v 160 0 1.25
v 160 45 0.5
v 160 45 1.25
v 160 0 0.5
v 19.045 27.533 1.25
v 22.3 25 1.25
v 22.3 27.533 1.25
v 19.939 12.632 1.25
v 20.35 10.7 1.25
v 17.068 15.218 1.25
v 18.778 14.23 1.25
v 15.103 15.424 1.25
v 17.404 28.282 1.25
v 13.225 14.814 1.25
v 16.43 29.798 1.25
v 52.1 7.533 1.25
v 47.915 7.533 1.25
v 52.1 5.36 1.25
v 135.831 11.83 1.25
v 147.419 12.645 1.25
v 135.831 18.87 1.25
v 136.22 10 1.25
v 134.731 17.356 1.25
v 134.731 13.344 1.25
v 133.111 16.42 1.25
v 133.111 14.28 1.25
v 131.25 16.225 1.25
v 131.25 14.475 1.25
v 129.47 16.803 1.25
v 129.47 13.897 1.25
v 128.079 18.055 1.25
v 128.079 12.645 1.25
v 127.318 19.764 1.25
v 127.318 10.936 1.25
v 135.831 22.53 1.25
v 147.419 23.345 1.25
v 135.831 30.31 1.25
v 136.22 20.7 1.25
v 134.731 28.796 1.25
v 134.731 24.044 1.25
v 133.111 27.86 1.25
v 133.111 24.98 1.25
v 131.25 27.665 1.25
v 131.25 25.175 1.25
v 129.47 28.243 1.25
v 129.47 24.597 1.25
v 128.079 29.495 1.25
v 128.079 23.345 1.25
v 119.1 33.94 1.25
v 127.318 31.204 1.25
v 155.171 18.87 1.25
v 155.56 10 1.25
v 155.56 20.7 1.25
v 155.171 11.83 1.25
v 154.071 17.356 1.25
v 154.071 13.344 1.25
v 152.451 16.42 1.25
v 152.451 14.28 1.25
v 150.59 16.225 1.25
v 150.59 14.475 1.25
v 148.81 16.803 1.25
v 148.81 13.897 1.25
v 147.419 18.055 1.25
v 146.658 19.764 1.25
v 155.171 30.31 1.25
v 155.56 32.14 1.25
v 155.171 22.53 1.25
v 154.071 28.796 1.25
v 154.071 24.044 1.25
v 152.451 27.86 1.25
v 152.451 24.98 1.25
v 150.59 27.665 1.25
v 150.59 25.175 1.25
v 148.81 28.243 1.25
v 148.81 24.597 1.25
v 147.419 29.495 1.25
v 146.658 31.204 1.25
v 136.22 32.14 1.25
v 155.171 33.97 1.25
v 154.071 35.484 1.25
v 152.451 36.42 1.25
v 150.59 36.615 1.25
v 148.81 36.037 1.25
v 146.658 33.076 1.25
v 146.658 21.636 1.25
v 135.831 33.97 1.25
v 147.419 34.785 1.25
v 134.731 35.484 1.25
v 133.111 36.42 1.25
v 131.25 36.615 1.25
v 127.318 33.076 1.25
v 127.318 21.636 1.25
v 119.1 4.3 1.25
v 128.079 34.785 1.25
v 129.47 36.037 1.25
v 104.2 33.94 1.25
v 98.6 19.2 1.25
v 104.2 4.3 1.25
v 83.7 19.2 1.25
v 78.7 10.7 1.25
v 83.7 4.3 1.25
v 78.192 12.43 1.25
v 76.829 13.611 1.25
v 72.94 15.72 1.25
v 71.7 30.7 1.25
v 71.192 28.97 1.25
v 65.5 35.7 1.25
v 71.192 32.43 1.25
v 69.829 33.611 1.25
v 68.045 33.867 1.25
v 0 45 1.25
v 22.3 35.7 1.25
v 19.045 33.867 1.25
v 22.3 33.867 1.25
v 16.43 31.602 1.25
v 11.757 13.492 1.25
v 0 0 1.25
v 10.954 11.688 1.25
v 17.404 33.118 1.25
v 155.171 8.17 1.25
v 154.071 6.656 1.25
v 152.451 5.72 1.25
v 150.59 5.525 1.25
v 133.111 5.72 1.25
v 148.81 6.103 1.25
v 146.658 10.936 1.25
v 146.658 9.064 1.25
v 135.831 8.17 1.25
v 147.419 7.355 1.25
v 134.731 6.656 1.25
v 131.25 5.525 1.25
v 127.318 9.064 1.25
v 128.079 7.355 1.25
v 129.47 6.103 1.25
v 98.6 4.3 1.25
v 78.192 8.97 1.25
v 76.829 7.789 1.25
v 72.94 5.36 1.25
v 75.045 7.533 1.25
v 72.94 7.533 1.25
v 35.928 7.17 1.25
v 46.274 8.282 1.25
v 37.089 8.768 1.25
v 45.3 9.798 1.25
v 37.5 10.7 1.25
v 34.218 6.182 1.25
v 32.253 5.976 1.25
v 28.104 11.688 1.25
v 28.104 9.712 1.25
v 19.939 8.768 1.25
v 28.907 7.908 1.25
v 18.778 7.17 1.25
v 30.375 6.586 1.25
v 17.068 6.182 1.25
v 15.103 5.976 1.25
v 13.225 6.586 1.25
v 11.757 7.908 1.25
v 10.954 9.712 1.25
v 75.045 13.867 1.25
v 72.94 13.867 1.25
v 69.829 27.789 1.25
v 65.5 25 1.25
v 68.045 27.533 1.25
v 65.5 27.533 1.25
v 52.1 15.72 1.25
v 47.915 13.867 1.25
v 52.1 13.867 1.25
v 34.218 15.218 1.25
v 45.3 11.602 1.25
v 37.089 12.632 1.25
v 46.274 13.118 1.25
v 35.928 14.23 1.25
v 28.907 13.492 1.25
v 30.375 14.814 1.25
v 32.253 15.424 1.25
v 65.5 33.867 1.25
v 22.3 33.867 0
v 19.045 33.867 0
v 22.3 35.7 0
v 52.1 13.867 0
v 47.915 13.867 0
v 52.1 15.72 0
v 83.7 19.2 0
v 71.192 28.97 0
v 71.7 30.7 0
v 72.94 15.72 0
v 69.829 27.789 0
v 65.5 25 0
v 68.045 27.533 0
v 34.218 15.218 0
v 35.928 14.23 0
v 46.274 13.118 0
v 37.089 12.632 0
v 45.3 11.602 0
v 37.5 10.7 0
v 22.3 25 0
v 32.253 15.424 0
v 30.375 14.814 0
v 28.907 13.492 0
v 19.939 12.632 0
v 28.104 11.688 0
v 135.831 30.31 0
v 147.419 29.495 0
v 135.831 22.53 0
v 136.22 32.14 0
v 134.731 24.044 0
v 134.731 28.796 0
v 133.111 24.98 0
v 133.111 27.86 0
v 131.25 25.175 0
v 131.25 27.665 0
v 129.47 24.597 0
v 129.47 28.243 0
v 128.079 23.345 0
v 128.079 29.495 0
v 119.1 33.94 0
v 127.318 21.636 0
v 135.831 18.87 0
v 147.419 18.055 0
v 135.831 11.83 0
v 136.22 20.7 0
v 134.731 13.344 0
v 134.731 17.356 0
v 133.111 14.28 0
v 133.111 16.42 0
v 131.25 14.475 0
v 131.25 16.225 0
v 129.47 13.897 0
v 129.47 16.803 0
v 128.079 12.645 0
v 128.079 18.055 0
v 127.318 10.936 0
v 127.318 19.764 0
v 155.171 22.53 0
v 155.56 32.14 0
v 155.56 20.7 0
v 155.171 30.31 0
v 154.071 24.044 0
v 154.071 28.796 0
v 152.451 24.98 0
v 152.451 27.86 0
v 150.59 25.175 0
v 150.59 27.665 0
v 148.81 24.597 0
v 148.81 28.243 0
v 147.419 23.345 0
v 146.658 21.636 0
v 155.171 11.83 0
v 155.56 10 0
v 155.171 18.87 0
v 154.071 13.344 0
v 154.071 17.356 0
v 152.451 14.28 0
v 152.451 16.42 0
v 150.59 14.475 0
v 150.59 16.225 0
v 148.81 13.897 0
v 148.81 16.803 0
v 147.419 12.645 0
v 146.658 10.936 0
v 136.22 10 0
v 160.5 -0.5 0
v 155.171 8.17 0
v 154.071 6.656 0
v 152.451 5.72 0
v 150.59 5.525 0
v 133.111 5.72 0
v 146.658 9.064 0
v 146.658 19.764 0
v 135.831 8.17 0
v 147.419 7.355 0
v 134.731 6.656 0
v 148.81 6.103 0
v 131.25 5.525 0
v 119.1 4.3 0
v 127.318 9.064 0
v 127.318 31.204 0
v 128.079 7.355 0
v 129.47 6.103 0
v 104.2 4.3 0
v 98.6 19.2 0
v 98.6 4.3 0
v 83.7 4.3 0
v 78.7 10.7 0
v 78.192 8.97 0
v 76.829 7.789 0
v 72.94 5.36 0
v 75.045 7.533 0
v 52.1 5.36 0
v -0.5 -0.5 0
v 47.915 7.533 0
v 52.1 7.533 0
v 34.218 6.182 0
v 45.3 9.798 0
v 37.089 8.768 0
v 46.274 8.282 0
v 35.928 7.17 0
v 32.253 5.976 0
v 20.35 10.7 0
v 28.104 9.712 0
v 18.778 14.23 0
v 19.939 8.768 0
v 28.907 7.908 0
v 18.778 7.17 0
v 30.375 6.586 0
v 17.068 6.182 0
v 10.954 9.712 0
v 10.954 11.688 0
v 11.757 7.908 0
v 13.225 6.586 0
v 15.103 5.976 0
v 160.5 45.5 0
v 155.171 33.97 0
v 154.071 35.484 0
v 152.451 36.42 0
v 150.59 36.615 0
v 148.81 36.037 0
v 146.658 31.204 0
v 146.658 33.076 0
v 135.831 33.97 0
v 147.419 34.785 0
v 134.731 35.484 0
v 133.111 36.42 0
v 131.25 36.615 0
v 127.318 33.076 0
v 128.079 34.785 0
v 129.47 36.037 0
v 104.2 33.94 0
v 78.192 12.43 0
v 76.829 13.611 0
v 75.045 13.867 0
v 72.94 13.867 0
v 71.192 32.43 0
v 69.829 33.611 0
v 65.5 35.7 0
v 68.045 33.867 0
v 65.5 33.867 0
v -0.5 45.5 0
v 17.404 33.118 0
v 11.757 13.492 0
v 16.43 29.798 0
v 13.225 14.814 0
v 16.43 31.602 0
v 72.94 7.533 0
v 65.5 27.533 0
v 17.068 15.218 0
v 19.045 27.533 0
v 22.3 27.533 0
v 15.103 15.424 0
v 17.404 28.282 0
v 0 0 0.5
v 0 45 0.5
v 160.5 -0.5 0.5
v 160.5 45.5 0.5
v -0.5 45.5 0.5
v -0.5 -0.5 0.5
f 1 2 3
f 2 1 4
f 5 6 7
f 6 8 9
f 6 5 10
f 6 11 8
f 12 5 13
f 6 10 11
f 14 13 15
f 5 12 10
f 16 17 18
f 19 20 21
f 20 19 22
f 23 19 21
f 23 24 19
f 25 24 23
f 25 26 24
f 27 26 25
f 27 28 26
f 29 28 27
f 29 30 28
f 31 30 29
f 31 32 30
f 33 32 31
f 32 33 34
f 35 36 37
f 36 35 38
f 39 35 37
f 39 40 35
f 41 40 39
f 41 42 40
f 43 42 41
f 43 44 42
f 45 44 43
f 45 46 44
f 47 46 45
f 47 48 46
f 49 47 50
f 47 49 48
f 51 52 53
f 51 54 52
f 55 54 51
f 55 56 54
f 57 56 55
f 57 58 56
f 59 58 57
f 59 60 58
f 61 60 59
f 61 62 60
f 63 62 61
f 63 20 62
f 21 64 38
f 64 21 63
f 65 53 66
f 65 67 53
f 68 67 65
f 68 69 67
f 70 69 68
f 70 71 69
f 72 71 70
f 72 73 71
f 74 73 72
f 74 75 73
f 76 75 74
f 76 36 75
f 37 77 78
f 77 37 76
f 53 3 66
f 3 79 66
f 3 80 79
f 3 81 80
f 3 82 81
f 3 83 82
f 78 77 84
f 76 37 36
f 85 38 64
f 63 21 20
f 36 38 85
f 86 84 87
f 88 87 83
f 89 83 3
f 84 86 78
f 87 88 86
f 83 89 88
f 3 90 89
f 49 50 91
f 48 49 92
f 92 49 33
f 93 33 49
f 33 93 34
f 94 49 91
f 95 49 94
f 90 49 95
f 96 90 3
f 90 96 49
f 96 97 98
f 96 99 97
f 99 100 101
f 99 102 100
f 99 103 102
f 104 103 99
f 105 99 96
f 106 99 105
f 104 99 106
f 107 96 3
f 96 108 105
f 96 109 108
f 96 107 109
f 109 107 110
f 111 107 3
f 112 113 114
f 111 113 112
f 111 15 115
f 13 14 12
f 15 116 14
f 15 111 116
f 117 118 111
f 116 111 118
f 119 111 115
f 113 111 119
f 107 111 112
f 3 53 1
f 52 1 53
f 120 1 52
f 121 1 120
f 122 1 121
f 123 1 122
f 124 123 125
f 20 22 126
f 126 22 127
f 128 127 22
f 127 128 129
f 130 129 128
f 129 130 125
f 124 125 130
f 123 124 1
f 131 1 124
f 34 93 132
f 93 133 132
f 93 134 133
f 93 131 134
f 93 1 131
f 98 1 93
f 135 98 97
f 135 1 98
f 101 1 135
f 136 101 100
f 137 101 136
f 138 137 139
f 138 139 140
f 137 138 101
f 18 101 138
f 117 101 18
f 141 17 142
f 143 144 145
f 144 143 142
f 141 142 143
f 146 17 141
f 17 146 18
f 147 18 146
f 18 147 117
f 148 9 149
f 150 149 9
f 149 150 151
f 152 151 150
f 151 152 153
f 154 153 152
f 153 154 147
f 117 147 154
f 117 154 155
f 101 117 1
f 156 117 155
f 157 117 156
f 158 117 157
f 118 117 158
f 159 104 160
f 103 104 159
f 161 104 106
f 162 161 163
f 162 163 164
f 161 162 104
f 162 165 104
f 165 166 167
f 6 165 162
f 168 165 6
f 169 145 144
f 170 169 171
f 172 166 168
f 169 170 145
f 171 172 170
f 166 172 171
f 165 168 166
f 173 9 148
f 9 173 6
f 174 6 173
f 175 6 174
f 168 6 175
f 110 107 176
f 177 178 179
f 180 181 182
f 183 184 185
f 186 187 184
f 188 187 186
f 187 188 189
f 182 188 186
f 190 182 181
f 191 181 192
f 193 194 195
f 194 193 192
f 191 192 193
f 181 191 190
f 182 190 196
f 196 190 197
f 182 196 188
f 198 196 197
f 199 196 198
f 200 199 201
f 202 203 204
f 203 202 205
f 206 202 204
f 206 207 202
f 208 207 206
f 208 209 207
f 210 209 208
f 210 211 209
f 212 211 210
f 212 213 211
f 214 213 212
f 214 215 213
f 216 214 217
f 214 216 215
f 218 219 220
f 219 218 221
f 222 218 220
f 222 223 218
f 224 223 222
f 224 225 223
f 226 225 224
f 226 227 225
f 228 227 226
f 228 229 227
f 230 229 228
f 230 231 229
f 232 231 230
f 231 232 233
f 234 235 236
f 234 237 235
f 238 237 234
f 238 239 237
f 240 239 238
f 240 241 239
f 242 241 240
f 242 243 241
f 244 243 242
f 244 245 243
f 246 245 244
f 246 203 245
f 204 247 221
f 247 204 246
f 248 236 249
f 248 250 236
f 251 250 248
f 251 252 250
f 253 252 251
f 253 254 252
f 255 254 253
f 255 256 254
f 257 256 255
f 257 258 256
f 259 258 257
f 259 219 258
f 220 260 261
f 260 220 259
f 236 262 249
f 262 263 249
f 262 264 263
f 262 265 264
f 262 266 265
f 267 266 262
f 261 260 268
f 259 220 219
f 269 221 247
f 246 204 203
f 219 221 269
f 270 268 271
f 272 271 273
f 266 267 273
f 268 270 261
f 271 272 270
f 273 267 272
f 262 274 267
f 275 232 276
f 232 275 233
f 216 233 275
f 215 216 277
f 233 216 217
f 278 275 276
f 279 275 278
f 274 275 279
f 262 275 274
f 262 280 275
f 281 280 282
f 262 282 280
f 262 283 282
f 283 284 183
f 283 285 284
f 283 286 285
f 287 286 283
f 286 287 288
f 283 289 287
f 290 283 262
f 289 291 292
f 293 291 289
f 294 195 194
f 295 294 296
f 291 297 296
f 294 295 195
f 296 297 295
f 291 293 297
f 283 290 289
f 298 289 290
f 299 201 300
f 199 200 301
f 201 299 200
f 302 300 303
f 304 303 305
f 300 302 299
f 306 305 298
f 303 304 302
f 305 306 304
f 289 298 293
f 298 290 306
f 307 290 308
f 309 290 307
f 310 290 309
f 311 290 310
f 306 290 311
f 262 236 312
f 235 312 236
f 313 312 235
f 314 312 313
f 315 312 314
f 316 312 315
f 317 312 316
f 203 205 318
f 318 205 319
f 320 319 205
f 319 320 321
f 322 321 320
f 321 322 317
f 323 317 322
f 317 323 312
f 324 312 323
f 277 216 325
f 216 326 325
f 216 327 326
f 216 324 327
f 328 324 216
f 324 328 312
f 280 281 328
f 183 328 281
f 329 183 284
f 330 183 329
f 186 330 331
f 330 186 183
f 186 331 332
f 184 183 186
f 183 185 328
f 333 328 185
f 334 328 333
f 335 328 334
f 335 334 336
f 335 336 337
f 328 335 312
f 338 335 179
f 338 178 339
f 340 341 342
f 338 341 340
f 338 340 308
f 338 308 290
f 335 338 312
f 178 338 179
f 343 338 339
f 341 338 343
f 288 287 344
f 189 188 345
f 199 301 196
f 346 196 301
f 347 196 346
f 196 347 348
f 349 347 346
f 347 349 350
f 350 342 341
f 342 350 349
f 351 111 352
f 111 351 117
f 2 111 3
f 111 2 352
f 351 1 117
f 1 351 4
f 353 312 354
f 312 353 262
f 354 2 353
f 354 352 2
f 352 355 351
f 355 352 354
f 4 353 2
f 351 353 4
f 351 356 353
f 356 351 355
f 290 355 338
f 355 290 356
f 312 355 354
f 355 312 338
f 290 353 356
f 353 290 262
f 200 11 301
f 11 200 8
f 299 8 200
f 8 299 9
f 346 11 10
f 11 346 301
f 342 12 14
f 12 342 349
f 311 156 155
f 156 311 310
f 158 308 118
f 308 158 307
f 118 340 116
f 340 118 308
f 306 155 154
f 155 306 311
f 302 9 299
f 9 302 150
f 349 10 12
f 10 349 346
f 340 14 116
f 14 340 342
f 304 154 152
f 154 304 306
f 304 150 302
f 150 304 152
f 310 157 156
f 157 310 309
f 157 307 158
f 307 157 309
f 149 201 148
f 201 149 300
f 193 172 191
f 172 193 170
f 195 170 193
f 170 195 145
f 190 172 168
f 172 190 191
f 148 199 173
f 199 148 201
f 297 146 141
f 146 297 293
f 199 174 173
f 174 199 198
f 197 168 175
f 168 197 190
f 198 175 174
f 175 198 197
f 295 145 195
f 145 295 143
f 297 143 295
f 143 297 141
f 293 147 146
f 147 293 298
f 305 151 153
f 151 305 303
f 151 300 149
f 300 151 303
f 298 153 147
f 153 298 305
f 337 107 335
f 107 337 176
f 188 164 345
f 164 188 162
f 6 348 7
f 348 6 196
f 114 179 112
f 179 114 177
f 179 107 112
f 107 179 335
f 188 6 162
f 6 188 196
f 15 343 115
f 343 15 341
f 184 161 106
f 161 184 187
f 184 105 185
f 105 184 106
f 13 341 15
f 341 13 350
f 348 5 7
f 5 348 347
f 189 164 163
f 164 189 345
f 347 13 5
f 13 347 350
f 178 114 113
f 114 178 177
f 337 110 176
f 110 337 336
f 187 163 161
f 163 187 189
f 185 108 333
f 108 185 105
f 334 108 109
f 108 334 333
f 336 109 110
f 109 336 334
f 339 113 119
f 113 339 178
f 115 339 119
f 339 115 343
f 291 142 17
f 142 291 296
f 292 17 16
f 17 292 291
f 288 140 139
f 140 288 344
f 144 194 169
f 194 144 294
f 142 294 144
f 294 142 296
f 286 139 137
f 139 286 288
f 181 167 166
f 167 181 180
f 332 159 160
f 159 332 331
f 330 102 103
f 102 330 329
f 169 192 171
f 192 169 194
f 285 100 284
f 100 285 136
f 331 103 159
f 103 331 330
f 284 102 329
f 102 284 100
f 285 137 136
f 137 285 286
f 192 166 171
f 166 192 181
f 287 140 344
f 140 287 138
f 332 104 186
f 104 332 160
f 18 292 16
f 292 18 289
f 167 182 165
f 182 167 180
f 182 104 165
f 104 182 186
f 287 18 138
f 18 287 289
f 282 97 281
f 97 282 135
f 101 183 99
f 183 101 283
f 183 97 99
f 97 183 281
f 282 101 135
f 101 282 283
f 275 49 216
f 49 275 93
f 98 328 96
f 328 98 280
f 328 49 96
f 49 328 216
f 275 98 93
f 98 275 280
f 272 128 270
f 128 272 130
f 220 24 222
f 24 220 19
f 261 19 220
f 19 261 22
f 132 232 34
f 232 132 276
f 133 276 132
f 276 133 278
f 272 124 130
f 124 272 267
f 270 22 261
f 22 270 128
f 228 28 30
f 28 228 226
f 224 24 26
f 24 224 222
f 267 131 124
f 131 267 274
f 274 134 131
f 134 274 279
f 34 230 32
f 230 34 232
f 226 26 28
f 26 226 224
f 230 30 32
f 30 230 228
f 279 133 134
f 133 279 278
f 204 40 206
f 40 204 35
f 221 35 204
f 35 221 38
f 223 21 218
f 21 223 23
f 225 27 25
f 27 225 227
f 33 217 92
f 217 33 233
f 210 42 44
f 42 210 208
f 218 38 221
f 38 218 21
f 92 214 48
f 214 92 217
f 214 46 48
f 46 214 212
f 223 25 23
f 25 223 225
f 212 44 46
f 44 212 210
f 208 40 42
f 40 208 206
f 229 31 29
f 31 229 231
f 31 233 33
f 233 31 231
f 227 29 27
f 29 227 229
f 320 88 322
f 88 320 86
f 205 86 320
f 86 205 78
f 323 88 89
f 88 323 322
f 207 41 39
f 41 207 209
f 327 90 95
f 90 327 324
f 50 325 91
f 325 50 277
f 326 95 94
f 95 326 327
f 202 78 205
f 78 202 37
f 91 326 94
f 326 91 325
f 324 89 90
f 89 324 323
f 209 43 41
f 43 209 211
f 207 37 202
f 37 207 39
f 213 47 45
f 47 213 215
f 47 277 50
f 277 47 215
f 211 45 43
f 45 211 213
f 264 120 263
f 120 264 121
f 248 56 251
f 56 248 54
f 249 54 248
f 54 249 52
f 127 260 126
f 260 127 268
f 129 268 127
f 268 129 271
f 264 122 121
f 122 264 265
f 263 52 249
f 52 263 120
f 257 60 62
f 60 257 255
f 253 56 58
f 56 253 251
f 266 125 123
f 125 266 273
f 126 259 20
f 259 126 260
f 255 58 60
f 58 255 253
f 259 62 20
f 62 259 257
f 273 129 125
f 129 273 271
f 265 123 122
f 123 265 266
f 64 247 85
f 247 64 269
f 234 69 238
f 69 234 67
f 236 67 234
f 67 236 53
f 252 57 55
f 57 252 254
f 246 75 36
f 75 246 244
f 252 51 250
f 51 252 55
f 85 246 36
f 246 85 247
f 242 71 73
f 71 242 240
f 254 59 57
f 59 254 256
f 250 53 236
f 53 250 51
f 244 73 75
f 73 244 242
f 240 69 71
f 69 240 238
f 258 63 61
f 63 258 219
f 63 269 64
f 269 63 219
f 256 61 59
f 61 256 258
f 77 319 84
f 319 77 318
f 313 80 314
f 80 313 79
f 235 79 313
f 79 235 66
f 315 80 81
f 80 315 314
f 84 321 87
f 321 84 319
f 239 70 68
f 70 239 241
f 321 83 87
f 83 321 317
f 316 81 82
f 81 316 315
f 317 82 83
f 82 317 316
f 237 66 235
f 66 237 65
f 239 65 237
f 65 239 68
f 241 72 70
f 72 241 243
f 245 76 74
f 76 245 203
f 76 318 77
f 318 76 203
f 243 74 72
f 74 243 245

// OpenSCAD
// I/O shield for an ASUS AsRock AM2NF6G-VSTA mainboard.
difference() {
	union() {
		// Default ATX blinds are 160x45mm
		cube([160, 45, 1.25]);

		translate([-0.5, -0.5, 0])
			cube([161, 46, 0.5]);
	}

	// PS/2 ports are about 9.5mm in diameter.
	// Mouse port.
	translate([15.6, 10.7, -0.1])
		cylinder(h = 4, r = 4.75, center=false);

	// Keyboard port.
	translate([32.75, 10.7, -0.1])
		cylinder(h = 4, r = 4.75, center=false);

	// Parallel port.
	translate([22.3, 25, -0.1])
		cube([43.2, 10.7, 4]);

	hull() {
		translate([19.5, 30.7, -0.1])
			cylinder(h = 4, r = 3.2, center=false);
		translate([68.5, 30.7, -0.1])
			cylinder(h = 4, r = 3.2, center=false);
	}

	// The VGA port.
	hull() {
		translate([48.37, 10.7, -0.1])
			cylinder(h = 4, r = 3.2, center=false);
		translate([75.5, 10.7, -0.1])
			cylinder(h = 4, r = 3.2, center=false);
	}

	translate([52.1, 5.36, -0.1])
		cube([20.84, 10.36, 4]);

	// First line of USB ports.
	translate([83.7, 4.3, -0.1])
		cube([14.9, 14.9, 4]);

	// Network and USB ports.
	translate([104.2, 4.3, -0.1])
		cube([14.9, 29.64, 4]);

	// GTR Bass.
	translate([131.72, 10, -0.1])
		cylinder(h = 4, r = 4.5, center = false);

	// SIGE SPK.
	translate([131.72, 20.7, -0.1])
		cylinder(h = 4, r = 4.5, center = false);

	// Rear SPK.
	translate([131.72, 32.14, -0.1])
		cylinder(h = 4, r = 4.5, center = false);

	// Mic in.
	translate([151.06, 10, -0.1])
		cylinder(h = 4, r = 4.5, center = false);

	// Front.
	translate([151.06, 20.7, -0.1])
		cylinder(h = 4, r = 4.5, center = false);

	// Line in.
	translate([151.06, 32.14, -0.1])
		cylinder(h = 4, r = 4.5, center = false);
}
